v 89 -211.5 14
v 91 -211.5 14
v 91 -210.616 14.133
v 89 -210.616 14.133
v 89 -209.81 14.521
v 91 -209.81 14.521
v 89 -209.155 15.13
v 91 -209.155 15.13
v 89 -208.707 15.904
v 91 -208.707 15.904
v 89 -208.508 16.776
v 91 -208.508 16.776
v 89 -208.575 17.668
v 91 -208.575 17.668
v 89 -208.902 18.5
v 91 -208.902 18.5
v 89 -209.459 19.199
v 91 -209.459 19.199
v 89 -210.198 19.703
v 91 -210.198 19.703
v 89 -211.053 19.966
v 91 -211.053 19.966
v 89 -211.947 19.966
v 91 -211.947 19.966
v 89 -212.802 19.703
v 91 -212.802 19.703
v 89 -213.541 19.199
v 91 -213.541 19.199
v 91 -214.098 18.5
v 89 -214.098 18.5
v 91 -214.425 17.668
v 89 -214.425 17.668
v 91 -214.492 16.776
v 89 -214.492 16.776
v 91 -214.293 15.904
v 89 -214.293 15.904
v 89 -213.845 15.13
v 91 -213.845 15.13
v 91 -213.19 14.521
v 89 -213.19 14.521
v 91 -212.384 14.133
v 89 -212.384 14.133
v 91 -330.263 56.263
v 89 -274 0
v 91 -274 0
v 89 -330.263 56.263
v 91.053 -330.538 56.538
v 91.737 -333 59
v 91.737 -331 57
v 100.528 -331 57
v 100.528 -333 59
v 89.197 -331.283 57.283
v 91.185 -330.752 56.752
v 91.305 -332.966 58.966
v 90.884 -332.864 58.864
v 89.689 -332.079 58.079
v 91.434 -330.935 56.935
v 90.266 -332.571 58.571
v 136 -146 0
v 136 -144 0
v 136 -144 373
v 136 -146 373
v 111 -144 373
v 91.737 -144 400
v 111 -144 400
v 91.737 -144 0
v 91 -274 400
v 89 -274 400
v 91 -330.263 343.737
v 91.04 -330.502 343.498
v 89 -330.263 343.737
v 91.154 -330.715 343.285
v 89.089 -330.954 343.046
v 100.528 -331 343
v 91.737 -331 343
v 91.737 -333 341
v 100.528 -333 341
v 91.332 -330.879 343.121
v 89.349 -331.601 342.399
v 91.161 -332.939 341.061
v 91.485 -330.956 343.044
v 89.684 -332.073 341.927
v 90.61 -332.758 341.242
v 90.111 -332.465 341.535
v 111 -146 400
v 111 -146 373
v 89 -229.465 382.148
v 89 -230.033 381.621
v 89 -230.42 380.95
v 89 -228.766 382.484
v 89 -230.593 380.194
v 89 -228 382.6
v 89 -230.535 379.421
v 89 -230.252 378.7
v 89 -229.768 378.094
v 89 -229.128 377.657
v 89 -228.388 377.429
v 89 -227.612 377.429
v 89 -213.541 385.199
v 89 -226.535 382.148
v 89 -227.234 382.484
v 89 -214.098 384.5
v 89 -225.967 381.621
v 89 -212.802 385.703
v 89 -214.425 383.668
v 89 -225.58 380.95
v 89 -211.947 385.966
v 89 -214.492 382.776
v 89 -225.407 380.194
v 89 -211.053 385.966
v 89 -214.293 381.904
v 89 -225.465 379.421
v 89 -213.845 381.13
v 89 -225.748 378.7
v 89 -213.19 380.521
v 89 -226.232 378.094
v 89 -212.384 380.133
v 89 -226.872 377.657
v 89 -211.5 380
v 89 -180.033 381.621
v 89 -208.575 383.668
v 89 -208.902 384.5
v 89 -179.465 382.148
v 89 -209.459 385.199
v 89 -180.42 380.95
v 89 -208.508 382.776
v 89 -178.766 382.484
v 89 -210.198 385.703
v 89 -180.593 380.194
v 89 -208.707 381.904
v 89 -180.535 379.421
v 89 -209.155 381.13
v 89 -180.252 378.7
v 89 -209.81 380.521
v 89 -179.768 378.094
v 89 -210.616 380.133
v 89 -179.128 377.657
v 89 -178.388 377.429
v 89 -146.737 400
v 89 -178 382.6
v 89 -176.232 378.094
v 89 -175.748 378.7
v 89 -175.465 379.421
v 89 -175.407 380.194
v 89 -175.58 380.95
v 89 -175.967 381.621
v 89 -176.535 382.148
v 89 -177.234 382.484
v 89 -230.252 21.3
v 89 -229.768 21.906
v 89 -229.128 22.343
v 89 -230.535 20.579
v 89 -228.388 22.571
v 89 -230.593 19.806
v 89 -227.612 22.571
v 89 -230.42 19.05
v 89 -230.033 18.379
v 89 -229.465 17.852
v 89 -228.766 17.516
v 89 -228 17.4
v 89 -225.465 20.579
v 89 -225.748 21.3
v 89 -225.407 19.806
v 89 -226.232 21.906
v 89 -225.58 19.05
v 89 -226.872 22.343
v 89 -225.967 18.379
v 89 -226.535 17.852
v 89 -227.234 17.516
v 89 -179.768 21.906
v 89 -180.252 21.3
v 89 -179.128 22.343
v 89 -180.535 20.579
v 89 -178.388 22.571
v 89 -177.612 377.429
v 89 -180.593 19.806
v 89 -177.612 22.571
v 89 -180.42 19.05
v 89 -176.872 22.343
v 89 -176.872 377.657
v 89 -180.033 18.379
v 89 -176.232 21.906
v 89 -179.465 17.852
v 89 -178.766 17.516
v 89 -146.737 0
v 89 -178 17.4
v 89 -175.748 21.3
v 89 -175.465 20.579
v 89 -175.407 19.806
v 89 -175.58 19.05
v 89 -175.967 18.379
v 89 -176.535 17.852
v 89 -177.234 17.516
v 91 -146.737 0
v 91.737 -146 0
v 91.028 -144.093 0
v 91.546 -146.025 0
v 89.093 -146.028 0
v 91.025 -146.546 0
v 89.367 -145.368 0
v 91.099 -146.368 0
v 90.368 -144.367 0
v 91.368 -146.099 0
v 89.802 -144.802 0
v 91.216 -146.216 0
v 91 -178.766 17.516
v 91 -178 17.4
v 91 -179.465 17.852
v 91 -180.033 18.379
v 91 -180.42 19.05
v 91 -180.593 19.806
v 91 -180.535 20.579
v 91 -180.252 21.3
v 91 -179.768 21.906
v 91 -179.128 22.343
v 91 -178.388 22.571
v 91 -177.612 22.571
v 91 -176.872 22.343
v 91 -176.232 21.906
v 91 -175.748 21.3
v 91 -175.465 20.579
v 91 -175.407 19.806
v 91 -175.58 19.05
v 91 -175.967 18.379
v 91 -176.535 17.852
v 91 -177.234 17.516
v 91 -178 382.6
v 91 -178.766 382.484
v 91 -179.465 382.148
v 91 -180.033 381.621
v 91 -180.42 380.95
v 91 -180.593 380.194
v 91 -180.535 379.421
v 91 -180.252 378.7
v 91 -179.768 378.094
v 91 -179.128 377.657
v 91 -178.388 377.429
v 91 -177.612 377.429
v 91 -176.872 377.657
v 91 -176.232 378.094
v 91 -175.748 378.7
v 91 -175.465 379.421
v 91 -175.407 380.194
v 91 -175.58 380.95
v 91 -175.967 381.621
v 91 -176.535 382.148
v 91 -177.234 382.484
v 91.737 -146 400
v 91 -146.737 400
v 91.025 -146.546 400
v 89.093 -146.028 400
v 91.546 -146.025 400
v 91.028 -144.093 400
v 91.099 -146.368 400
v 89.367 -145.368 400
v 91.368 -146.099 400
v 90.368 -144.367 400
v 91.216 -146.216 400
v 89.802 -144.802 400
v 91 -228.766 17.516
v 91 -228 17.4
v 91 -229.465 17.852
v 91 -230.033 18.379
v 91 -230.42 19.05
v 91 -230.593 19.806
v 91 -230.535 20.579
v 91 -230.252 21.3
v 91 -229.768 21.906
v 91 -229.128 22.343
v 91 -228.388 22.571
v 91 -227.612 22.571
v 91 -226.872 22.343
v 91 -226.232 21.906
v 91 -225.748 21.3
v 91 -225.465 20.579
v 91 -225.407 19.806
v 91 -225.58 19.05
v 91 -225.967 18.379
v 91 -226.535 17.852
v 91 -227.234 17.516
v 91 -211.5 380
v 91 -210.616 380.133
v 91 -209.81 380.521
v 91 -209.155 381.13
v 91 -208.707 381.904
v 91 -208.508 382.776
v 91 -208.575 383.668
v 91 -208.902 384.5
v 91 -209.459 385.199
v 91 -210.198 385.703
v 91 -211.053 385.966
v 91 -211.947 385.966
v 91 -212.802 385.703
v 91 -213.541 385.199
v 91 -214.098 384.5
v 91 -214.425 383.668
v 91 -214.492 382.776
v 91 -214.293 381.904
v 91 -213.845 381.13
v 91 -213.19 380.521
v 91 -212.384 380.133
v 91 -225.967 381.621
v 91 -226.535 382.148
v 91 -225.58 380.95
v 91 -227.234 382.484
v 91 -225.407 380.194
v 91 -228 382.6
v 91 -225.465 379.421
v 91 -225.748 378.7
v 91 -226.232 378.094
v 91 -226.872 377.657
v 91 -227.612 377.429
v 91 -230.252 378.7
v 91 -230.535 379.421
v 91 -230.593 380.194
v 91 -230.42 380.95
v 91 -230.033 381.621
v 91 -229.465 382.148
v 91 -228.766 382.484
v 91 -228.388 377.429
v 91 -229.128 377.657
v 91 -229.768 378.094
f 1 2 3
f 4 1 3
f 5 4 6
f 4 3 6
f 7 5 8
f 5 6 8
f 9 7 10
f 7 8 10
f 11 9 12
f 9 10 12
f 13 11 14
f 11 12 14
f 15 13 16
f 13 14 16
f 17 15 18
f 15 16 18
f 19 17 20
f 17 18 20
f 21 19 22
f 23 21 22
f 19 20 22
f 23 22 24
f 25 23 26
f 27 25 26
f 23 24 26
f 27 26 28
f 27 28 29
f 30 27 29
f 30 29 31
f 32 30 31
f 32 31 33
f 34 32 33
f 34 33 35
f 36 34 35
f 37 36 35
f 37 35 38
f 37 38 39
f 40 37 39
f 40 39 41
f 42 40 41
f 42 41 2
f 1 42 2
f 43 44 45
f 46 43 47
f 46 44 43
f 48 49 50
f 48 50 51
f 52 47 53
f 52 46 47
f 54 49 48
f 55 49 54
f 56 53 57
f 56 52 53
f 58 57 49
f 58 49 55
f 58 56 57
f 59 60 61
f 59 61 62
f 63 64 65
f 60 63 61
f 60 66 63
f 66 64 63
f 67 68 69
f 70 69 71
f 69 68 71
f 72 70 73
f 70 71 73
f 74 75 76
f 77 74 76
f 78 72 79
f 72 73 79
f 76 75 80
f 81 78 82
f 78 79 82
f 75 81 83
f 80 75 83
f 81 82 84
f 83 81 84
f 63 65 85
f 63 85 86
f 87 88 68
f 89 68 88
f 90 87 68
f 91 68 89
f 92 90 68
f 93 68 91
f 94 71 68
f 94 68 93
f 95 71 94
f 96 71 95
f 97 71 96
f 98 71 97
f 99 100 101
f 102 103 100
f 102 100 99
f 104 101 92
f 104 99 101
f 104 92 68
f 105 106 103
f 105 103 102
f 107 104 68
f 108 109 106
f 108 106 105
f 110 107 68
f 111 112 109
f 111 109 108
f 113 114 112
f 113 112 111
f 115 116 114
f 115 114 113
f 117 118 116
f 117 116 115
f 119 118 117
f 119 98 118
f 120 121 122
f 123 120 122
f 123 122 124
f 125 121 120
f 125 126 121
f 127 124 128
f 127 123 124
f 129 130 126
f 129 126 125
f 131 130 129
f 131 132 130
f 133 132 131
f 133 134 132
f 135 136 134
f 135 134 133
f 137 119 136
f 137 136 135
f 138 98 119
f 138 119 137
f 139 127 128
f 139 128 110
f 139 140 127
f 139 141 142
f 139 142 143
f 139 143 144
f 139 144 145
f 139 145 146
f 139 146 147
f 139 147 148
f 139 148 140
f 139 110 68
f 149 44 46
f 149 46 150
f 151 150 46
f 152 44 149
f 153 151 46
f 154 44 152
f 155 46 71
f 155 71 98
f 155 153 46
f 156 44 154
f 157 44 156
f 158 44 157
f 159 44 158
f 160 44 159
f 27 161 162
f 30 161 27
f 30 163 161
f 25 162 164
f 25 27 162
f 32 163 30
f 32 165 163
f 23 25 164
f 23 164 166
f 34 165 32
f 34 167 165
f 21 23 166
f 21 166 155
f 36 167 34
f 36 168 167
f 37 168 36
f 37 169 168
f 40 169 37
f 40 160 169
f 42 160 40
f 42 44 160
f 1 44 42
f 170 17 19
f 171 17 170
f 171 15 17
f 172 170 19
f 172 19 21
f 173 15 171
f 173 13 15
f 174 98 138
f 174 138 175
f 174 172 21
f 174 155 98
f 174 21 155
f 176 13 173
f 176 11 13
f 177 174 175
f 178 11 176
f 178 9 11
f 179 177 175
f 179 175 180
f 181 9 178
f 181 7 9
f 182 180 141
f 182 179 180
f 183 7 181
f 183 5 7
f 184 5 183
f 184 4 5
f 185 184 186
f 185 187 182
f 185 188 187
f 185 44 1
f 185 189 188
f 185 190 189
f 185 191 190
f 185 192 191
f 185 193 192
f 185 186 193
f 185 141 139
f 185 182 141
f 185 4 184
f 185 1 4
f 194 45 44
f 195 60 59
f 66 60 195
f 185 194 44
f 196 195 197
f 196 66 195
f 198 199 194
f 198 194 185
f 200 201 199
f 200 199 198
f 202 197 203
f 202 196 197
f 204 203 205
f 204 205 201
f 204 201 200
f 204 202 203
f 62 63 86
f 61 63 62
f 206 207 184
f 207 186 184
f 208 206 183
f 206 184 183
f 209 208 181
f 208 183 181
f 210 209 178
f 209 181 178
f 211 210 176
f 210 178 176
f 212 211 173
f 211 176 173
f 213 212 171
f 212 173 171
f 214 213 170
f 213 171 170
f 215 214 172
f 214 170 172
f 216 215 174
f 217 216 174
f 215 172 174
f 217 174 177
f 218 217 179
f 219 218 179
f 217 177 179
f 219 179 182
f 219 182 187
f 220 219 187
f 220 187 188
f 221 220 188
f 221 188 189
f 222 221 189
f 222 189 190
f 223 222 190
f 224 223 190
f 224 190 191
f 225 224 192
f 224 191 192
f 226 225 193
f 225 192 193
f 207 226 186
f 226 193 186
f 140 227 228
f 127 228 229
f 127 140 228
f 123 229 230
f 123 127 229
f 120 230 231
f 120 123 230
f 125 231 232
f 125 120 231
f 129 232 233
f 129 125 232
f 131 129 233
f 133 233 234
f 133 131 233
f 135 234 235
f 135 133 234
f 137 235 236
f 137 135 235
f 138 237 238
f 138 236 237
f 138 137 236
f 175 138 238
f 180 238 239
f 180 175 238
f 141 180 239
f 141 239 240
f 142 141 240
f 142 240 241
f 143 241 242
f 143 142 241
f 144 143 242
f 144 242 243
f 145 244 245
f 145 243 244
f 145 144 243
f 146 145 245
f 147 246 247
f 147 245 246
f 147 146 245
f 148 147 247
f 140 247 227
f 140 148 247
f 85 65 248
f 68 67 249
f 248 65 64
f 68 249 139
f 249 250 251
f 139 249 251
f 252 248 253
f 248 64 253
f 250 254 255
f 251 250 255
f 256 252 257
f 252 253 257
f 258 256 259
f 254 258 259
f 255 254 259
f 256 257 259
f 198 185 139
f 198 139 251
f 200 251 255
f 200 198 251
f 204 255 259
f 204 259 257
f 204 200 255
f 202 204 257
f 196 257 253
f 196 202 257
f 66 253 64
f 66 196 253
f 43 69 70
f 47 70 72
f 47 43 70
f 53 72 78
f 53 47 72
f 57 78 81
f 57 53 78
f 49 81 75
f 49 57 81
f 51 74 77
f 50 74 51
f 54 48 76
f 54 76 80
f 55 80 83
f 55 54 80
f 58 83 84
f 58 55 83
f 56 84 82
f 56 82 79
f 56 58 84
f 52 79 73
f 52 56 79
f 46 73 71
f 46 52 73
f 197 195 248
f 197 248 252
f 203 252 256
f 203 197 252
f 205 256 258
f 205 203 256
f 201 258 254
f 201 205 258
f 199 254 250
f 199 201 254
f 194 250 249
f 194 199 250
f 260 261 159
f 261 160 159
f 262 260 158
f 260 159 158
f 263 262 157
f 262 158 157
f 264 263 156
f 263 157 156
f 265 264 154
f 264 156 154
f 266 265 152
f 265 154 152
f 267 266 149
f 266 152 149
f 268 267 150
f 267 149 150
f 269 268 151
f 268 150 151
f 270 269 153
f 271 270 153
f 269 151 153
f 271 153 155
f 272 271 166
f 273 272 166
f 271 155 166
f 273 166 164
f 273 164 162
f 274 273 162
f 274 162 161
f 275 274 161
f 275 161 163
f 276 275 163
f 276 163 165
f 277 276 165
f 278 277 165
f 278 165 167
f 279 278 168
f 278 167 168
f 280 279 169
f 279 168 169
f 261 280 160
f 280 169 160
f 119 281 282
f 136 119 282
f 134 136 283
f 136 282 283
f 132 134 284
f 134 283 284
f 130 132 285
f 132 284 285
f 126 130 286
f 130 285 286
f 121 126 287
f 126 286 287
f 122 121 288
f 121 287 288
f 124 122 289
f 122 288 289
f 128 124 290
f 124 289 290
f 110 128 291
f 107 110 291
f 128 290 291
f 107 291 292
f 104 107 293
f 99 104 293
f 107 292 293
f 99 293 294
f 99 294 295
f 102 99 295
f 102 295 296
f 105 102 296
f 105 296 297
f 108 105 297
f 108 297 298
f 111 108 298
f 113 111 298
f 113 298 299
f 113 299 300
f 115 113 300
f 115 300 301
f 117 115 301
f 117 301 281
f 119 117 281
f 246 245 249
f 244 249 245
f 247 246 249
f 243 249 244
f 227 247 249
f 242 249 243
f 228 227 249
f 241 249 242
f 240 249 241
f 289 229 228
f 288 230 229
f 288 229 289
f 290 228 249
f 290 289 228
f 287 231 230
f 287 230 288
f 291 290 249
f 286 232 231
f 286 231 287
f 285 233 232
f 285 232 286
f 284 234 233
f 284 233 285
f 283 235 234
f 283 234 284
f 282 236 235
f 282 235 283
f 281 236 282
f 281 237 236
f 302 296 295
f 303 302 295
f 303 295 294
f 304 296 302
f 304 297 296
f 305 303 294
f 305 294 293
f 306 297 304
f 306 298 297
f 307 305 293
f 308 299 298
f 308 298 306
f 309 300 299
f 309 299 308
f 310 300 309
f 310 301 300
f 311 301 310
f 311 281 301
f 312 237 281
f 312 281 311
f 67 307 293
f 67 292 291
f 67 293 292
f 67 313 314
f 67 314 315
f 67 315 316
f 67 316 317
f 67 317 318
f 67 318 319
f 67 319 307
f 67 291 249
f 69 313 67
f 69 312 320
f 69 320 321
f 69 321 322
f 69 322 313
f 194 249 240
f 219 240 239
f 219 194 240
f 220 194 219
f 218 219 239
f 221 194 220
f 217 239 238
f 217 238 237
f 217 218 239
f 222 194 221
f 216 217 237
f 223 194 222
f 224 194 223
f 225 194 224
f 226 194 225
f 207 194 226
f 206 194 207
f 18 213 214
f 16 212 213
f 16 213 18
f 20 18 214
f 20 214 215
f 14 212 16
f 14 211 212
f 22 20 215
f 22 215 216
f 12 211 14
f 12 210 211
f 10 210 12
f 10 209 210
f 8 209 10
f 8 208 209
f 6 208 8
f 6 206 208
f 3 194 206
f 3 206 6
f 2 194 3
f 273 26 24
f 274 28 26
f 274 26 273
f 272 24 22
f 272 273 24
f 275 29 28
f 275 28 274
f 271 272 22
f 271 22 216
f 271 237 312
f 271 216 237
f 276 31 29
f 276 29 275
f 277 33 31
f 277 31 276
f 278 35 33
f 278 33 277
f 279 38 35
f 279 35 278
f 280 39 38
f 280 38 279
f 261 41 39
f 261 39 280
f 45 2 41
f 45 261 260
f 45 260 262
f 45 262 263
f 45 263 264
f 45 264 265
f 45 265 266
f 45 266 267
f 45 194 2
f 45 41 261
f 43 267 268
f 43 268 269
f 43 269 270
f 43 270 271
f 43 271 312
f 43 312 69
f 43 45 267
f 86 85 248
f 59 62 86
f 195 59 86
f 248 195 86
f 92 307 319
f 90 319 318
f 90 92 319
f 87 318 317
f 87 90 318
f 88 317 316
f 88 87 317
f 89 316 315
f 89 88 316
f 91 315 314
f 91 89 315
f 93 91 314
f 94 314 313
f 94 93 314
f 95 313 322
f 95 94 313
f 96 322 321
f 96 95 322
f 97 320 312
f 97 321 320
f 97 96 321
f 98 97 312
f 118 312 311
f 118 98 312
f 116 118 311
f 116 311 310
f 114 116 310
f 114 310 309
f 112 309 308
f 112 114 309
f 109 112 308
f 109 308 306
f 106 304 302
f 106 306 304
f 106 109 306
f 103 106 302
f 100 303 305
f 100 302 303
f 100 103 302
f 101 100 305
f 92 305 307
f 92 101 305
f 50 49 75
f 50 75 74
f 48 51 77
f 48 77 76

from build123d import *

# Parameters (mm, degrees)
SM_BASE_FLANGE_1_DEPTH           = 400
HOLE_WIZARD_5_2_5_2_1_AT_2_COUNT = 2
HOLE_WIZARD_5_2_5_2_1_AT_2_PITCH = 50
CUT_EXTRUDE_1_DEPTH              = 523.587791668
HOLE_WIZARD_6_0_6_1_D            = 6
HOLE_WIZARD_6_0_6_1_DEPTH        = 220
HOLE_WIZARD_6_0_6_1_TIP          = 1.802581857
SKETCH_11_W                      = 32.021510722
SKETCH_11_H                      = 35
CUT_EXTRUDE_2_DEPTH              = 25


# Sheet-metal steps are written as plain solids
with BuildPart() as part:
    # Sketch 1 → 基体-法兰1 (new body)
    with BuildSketch(Plane.XY):
        with BuildLine():
            Line((136, -146), (91.7366, -146))
            ThreePointArc((91.7366, -146), (91.215745145, -146.215745145), (91, -146.7366))
            Line((91, -146.7366), (91, -330.2634))
            ThreePointArc((91, -330.2634), (91.215745145, -330.784254855), (91.7366, -331))
            Line((91.7366, -331), (100.527645566, -331))
            Line((100.527645566, -331), (100.527645566, -333))
            Line((100.527645566, -333), (91.7366, -333))
            ThreePointArc((91.7366, -333), (89.801531583, -332.198468417), (89, -330.2634))
            Line((89, -330.2634), (89, -146.7366))
            ThreePointArc((89, -146.7366), (89.801531583, -144.801531583), (91.7366, -144))
            Line((91.7366, -144), (136, -144))
            Line((136, -144), (136, -146))
        make_face()
    extrude(amount=SM_BASE_FLANGE_1_DEPTH)

    # 草图6 → Ø5.2 (5.2) 直径孔1 (revolve, cut)
    with BuildSketch(Plane(origin=(89, -178, 380), x_dir=(0, 0, 1), z_dir=(0, 1, 0))):
        Polygon((0, 0), (0, 11.562237609), (2.6, 10), (2.6, 0), align=None)
    hole_wizard_5_2_5_2_1 = revolve(axis=Axis((82.65, -178, 380), (1, 0, 0)), mode=Mode.SUBTRACT)

    # Ø5.2 (5.2) 直径孔1 at 2: Ø5.2 (5.2) 直径孔1 ×2
    with Locations(*[(0, -i * HOLE_WIZARD_5_2_5_2_1_AT_2_PITCH, 0) for i in range(1, HOLE_WIZARD_5_2_5_2_1_AT_2_COUNT)]):
        add(hole_wizard_5_2_5_2_1, mode=Mode.SUBTRACT)

    # 镜向1: Ø5.2 (5.2) 直径孔1 across plane
    add(hole_wizard_5_2_5_2_1.mirror(Plane(origin=(0, 0, 200), x_dir=(1, 0, 0), z_dir=(0, 0, -1))), mode=Mode.SUBTRACT)

    # 镜向1 copy 1 sketch → 镜向1 copy 1 (revolve, cut)
    with BuildSketch(Plane(origin=(89, -228, 20), x_dir=(0, 0, -1), z_dir=(0, 1, 0))):
        Polygon((0, 0), (0, -11.562237609), (2.6, -10), (2.6, 0), align=None)
    revolve(axis=Axis((82.65, -228, 20), (-1, 0, 0)), mode=Mode.SUBTRACT)

    # 草图8 → 切除-拉伸1 (cut, symmetric)
    with BuildSketch(Plane.ZY.offset(-89)):
        Polygon((-267.508163369, -941.508163369), (334.373798762, -339.626201238), (400, -274), (1001.88196213, 327.88196213), (2205.645886391, -875.88196213), (936.255760892, -2145.27208763), align=None)
    cut_extrude_1 = extrude(amount=CUT_EXTRUDE_1_DEPTH, both=True, mode=Mode.SUBTRACT)

    # 镜向2: 切除-拉伸1 across plane
    add(cut_extrude_1.mirror(Plane(origin=(0, 0, 200), x_dir=(1, 0, 0), z_dir=(0, 0, -1))), mode=Mode.SUBTRACT)

    # Ø6.0 (6) 直径孔1
    with Locations(Plane.ZY.offset(-89)):
        with Locations((17, -211.5), (383, -211.5)):
            Hole(HOLE_WIZARD_6_0_6_1_D / 2, depth=HOLE_WIZARD_6_0_6_1_DEPTH)
            with Locations((0, 0, -(HOLE_WIZARD_6_0_6_1_DEPTH + HOLE_WIZARD_6_0_6_1_TIP / 2))):  # 118° drill point
                Cone(0, HOLE_WIZARD_6_0_6_1_D / 2, HOLE_WIZARD_6_0_6_1_TIP, mode=Mode.SUBTRACT)

    # 草图11 → 切除-拉伸2 (cut)
    with BuildSketch(Plane(origin=(0, -144, 0), x_dir=(1, 0, 0), z_dir=(0, 1, 0))):
        with Locations((127.010755361, -390.5)):
            Rectangle(SKETCH_11_W, SKETCH_11_H)
    extrude(amount=-CUT_EXTRUDE_2_DEPTH, mode=Mode.SUBTRACT)


solid = part.part
